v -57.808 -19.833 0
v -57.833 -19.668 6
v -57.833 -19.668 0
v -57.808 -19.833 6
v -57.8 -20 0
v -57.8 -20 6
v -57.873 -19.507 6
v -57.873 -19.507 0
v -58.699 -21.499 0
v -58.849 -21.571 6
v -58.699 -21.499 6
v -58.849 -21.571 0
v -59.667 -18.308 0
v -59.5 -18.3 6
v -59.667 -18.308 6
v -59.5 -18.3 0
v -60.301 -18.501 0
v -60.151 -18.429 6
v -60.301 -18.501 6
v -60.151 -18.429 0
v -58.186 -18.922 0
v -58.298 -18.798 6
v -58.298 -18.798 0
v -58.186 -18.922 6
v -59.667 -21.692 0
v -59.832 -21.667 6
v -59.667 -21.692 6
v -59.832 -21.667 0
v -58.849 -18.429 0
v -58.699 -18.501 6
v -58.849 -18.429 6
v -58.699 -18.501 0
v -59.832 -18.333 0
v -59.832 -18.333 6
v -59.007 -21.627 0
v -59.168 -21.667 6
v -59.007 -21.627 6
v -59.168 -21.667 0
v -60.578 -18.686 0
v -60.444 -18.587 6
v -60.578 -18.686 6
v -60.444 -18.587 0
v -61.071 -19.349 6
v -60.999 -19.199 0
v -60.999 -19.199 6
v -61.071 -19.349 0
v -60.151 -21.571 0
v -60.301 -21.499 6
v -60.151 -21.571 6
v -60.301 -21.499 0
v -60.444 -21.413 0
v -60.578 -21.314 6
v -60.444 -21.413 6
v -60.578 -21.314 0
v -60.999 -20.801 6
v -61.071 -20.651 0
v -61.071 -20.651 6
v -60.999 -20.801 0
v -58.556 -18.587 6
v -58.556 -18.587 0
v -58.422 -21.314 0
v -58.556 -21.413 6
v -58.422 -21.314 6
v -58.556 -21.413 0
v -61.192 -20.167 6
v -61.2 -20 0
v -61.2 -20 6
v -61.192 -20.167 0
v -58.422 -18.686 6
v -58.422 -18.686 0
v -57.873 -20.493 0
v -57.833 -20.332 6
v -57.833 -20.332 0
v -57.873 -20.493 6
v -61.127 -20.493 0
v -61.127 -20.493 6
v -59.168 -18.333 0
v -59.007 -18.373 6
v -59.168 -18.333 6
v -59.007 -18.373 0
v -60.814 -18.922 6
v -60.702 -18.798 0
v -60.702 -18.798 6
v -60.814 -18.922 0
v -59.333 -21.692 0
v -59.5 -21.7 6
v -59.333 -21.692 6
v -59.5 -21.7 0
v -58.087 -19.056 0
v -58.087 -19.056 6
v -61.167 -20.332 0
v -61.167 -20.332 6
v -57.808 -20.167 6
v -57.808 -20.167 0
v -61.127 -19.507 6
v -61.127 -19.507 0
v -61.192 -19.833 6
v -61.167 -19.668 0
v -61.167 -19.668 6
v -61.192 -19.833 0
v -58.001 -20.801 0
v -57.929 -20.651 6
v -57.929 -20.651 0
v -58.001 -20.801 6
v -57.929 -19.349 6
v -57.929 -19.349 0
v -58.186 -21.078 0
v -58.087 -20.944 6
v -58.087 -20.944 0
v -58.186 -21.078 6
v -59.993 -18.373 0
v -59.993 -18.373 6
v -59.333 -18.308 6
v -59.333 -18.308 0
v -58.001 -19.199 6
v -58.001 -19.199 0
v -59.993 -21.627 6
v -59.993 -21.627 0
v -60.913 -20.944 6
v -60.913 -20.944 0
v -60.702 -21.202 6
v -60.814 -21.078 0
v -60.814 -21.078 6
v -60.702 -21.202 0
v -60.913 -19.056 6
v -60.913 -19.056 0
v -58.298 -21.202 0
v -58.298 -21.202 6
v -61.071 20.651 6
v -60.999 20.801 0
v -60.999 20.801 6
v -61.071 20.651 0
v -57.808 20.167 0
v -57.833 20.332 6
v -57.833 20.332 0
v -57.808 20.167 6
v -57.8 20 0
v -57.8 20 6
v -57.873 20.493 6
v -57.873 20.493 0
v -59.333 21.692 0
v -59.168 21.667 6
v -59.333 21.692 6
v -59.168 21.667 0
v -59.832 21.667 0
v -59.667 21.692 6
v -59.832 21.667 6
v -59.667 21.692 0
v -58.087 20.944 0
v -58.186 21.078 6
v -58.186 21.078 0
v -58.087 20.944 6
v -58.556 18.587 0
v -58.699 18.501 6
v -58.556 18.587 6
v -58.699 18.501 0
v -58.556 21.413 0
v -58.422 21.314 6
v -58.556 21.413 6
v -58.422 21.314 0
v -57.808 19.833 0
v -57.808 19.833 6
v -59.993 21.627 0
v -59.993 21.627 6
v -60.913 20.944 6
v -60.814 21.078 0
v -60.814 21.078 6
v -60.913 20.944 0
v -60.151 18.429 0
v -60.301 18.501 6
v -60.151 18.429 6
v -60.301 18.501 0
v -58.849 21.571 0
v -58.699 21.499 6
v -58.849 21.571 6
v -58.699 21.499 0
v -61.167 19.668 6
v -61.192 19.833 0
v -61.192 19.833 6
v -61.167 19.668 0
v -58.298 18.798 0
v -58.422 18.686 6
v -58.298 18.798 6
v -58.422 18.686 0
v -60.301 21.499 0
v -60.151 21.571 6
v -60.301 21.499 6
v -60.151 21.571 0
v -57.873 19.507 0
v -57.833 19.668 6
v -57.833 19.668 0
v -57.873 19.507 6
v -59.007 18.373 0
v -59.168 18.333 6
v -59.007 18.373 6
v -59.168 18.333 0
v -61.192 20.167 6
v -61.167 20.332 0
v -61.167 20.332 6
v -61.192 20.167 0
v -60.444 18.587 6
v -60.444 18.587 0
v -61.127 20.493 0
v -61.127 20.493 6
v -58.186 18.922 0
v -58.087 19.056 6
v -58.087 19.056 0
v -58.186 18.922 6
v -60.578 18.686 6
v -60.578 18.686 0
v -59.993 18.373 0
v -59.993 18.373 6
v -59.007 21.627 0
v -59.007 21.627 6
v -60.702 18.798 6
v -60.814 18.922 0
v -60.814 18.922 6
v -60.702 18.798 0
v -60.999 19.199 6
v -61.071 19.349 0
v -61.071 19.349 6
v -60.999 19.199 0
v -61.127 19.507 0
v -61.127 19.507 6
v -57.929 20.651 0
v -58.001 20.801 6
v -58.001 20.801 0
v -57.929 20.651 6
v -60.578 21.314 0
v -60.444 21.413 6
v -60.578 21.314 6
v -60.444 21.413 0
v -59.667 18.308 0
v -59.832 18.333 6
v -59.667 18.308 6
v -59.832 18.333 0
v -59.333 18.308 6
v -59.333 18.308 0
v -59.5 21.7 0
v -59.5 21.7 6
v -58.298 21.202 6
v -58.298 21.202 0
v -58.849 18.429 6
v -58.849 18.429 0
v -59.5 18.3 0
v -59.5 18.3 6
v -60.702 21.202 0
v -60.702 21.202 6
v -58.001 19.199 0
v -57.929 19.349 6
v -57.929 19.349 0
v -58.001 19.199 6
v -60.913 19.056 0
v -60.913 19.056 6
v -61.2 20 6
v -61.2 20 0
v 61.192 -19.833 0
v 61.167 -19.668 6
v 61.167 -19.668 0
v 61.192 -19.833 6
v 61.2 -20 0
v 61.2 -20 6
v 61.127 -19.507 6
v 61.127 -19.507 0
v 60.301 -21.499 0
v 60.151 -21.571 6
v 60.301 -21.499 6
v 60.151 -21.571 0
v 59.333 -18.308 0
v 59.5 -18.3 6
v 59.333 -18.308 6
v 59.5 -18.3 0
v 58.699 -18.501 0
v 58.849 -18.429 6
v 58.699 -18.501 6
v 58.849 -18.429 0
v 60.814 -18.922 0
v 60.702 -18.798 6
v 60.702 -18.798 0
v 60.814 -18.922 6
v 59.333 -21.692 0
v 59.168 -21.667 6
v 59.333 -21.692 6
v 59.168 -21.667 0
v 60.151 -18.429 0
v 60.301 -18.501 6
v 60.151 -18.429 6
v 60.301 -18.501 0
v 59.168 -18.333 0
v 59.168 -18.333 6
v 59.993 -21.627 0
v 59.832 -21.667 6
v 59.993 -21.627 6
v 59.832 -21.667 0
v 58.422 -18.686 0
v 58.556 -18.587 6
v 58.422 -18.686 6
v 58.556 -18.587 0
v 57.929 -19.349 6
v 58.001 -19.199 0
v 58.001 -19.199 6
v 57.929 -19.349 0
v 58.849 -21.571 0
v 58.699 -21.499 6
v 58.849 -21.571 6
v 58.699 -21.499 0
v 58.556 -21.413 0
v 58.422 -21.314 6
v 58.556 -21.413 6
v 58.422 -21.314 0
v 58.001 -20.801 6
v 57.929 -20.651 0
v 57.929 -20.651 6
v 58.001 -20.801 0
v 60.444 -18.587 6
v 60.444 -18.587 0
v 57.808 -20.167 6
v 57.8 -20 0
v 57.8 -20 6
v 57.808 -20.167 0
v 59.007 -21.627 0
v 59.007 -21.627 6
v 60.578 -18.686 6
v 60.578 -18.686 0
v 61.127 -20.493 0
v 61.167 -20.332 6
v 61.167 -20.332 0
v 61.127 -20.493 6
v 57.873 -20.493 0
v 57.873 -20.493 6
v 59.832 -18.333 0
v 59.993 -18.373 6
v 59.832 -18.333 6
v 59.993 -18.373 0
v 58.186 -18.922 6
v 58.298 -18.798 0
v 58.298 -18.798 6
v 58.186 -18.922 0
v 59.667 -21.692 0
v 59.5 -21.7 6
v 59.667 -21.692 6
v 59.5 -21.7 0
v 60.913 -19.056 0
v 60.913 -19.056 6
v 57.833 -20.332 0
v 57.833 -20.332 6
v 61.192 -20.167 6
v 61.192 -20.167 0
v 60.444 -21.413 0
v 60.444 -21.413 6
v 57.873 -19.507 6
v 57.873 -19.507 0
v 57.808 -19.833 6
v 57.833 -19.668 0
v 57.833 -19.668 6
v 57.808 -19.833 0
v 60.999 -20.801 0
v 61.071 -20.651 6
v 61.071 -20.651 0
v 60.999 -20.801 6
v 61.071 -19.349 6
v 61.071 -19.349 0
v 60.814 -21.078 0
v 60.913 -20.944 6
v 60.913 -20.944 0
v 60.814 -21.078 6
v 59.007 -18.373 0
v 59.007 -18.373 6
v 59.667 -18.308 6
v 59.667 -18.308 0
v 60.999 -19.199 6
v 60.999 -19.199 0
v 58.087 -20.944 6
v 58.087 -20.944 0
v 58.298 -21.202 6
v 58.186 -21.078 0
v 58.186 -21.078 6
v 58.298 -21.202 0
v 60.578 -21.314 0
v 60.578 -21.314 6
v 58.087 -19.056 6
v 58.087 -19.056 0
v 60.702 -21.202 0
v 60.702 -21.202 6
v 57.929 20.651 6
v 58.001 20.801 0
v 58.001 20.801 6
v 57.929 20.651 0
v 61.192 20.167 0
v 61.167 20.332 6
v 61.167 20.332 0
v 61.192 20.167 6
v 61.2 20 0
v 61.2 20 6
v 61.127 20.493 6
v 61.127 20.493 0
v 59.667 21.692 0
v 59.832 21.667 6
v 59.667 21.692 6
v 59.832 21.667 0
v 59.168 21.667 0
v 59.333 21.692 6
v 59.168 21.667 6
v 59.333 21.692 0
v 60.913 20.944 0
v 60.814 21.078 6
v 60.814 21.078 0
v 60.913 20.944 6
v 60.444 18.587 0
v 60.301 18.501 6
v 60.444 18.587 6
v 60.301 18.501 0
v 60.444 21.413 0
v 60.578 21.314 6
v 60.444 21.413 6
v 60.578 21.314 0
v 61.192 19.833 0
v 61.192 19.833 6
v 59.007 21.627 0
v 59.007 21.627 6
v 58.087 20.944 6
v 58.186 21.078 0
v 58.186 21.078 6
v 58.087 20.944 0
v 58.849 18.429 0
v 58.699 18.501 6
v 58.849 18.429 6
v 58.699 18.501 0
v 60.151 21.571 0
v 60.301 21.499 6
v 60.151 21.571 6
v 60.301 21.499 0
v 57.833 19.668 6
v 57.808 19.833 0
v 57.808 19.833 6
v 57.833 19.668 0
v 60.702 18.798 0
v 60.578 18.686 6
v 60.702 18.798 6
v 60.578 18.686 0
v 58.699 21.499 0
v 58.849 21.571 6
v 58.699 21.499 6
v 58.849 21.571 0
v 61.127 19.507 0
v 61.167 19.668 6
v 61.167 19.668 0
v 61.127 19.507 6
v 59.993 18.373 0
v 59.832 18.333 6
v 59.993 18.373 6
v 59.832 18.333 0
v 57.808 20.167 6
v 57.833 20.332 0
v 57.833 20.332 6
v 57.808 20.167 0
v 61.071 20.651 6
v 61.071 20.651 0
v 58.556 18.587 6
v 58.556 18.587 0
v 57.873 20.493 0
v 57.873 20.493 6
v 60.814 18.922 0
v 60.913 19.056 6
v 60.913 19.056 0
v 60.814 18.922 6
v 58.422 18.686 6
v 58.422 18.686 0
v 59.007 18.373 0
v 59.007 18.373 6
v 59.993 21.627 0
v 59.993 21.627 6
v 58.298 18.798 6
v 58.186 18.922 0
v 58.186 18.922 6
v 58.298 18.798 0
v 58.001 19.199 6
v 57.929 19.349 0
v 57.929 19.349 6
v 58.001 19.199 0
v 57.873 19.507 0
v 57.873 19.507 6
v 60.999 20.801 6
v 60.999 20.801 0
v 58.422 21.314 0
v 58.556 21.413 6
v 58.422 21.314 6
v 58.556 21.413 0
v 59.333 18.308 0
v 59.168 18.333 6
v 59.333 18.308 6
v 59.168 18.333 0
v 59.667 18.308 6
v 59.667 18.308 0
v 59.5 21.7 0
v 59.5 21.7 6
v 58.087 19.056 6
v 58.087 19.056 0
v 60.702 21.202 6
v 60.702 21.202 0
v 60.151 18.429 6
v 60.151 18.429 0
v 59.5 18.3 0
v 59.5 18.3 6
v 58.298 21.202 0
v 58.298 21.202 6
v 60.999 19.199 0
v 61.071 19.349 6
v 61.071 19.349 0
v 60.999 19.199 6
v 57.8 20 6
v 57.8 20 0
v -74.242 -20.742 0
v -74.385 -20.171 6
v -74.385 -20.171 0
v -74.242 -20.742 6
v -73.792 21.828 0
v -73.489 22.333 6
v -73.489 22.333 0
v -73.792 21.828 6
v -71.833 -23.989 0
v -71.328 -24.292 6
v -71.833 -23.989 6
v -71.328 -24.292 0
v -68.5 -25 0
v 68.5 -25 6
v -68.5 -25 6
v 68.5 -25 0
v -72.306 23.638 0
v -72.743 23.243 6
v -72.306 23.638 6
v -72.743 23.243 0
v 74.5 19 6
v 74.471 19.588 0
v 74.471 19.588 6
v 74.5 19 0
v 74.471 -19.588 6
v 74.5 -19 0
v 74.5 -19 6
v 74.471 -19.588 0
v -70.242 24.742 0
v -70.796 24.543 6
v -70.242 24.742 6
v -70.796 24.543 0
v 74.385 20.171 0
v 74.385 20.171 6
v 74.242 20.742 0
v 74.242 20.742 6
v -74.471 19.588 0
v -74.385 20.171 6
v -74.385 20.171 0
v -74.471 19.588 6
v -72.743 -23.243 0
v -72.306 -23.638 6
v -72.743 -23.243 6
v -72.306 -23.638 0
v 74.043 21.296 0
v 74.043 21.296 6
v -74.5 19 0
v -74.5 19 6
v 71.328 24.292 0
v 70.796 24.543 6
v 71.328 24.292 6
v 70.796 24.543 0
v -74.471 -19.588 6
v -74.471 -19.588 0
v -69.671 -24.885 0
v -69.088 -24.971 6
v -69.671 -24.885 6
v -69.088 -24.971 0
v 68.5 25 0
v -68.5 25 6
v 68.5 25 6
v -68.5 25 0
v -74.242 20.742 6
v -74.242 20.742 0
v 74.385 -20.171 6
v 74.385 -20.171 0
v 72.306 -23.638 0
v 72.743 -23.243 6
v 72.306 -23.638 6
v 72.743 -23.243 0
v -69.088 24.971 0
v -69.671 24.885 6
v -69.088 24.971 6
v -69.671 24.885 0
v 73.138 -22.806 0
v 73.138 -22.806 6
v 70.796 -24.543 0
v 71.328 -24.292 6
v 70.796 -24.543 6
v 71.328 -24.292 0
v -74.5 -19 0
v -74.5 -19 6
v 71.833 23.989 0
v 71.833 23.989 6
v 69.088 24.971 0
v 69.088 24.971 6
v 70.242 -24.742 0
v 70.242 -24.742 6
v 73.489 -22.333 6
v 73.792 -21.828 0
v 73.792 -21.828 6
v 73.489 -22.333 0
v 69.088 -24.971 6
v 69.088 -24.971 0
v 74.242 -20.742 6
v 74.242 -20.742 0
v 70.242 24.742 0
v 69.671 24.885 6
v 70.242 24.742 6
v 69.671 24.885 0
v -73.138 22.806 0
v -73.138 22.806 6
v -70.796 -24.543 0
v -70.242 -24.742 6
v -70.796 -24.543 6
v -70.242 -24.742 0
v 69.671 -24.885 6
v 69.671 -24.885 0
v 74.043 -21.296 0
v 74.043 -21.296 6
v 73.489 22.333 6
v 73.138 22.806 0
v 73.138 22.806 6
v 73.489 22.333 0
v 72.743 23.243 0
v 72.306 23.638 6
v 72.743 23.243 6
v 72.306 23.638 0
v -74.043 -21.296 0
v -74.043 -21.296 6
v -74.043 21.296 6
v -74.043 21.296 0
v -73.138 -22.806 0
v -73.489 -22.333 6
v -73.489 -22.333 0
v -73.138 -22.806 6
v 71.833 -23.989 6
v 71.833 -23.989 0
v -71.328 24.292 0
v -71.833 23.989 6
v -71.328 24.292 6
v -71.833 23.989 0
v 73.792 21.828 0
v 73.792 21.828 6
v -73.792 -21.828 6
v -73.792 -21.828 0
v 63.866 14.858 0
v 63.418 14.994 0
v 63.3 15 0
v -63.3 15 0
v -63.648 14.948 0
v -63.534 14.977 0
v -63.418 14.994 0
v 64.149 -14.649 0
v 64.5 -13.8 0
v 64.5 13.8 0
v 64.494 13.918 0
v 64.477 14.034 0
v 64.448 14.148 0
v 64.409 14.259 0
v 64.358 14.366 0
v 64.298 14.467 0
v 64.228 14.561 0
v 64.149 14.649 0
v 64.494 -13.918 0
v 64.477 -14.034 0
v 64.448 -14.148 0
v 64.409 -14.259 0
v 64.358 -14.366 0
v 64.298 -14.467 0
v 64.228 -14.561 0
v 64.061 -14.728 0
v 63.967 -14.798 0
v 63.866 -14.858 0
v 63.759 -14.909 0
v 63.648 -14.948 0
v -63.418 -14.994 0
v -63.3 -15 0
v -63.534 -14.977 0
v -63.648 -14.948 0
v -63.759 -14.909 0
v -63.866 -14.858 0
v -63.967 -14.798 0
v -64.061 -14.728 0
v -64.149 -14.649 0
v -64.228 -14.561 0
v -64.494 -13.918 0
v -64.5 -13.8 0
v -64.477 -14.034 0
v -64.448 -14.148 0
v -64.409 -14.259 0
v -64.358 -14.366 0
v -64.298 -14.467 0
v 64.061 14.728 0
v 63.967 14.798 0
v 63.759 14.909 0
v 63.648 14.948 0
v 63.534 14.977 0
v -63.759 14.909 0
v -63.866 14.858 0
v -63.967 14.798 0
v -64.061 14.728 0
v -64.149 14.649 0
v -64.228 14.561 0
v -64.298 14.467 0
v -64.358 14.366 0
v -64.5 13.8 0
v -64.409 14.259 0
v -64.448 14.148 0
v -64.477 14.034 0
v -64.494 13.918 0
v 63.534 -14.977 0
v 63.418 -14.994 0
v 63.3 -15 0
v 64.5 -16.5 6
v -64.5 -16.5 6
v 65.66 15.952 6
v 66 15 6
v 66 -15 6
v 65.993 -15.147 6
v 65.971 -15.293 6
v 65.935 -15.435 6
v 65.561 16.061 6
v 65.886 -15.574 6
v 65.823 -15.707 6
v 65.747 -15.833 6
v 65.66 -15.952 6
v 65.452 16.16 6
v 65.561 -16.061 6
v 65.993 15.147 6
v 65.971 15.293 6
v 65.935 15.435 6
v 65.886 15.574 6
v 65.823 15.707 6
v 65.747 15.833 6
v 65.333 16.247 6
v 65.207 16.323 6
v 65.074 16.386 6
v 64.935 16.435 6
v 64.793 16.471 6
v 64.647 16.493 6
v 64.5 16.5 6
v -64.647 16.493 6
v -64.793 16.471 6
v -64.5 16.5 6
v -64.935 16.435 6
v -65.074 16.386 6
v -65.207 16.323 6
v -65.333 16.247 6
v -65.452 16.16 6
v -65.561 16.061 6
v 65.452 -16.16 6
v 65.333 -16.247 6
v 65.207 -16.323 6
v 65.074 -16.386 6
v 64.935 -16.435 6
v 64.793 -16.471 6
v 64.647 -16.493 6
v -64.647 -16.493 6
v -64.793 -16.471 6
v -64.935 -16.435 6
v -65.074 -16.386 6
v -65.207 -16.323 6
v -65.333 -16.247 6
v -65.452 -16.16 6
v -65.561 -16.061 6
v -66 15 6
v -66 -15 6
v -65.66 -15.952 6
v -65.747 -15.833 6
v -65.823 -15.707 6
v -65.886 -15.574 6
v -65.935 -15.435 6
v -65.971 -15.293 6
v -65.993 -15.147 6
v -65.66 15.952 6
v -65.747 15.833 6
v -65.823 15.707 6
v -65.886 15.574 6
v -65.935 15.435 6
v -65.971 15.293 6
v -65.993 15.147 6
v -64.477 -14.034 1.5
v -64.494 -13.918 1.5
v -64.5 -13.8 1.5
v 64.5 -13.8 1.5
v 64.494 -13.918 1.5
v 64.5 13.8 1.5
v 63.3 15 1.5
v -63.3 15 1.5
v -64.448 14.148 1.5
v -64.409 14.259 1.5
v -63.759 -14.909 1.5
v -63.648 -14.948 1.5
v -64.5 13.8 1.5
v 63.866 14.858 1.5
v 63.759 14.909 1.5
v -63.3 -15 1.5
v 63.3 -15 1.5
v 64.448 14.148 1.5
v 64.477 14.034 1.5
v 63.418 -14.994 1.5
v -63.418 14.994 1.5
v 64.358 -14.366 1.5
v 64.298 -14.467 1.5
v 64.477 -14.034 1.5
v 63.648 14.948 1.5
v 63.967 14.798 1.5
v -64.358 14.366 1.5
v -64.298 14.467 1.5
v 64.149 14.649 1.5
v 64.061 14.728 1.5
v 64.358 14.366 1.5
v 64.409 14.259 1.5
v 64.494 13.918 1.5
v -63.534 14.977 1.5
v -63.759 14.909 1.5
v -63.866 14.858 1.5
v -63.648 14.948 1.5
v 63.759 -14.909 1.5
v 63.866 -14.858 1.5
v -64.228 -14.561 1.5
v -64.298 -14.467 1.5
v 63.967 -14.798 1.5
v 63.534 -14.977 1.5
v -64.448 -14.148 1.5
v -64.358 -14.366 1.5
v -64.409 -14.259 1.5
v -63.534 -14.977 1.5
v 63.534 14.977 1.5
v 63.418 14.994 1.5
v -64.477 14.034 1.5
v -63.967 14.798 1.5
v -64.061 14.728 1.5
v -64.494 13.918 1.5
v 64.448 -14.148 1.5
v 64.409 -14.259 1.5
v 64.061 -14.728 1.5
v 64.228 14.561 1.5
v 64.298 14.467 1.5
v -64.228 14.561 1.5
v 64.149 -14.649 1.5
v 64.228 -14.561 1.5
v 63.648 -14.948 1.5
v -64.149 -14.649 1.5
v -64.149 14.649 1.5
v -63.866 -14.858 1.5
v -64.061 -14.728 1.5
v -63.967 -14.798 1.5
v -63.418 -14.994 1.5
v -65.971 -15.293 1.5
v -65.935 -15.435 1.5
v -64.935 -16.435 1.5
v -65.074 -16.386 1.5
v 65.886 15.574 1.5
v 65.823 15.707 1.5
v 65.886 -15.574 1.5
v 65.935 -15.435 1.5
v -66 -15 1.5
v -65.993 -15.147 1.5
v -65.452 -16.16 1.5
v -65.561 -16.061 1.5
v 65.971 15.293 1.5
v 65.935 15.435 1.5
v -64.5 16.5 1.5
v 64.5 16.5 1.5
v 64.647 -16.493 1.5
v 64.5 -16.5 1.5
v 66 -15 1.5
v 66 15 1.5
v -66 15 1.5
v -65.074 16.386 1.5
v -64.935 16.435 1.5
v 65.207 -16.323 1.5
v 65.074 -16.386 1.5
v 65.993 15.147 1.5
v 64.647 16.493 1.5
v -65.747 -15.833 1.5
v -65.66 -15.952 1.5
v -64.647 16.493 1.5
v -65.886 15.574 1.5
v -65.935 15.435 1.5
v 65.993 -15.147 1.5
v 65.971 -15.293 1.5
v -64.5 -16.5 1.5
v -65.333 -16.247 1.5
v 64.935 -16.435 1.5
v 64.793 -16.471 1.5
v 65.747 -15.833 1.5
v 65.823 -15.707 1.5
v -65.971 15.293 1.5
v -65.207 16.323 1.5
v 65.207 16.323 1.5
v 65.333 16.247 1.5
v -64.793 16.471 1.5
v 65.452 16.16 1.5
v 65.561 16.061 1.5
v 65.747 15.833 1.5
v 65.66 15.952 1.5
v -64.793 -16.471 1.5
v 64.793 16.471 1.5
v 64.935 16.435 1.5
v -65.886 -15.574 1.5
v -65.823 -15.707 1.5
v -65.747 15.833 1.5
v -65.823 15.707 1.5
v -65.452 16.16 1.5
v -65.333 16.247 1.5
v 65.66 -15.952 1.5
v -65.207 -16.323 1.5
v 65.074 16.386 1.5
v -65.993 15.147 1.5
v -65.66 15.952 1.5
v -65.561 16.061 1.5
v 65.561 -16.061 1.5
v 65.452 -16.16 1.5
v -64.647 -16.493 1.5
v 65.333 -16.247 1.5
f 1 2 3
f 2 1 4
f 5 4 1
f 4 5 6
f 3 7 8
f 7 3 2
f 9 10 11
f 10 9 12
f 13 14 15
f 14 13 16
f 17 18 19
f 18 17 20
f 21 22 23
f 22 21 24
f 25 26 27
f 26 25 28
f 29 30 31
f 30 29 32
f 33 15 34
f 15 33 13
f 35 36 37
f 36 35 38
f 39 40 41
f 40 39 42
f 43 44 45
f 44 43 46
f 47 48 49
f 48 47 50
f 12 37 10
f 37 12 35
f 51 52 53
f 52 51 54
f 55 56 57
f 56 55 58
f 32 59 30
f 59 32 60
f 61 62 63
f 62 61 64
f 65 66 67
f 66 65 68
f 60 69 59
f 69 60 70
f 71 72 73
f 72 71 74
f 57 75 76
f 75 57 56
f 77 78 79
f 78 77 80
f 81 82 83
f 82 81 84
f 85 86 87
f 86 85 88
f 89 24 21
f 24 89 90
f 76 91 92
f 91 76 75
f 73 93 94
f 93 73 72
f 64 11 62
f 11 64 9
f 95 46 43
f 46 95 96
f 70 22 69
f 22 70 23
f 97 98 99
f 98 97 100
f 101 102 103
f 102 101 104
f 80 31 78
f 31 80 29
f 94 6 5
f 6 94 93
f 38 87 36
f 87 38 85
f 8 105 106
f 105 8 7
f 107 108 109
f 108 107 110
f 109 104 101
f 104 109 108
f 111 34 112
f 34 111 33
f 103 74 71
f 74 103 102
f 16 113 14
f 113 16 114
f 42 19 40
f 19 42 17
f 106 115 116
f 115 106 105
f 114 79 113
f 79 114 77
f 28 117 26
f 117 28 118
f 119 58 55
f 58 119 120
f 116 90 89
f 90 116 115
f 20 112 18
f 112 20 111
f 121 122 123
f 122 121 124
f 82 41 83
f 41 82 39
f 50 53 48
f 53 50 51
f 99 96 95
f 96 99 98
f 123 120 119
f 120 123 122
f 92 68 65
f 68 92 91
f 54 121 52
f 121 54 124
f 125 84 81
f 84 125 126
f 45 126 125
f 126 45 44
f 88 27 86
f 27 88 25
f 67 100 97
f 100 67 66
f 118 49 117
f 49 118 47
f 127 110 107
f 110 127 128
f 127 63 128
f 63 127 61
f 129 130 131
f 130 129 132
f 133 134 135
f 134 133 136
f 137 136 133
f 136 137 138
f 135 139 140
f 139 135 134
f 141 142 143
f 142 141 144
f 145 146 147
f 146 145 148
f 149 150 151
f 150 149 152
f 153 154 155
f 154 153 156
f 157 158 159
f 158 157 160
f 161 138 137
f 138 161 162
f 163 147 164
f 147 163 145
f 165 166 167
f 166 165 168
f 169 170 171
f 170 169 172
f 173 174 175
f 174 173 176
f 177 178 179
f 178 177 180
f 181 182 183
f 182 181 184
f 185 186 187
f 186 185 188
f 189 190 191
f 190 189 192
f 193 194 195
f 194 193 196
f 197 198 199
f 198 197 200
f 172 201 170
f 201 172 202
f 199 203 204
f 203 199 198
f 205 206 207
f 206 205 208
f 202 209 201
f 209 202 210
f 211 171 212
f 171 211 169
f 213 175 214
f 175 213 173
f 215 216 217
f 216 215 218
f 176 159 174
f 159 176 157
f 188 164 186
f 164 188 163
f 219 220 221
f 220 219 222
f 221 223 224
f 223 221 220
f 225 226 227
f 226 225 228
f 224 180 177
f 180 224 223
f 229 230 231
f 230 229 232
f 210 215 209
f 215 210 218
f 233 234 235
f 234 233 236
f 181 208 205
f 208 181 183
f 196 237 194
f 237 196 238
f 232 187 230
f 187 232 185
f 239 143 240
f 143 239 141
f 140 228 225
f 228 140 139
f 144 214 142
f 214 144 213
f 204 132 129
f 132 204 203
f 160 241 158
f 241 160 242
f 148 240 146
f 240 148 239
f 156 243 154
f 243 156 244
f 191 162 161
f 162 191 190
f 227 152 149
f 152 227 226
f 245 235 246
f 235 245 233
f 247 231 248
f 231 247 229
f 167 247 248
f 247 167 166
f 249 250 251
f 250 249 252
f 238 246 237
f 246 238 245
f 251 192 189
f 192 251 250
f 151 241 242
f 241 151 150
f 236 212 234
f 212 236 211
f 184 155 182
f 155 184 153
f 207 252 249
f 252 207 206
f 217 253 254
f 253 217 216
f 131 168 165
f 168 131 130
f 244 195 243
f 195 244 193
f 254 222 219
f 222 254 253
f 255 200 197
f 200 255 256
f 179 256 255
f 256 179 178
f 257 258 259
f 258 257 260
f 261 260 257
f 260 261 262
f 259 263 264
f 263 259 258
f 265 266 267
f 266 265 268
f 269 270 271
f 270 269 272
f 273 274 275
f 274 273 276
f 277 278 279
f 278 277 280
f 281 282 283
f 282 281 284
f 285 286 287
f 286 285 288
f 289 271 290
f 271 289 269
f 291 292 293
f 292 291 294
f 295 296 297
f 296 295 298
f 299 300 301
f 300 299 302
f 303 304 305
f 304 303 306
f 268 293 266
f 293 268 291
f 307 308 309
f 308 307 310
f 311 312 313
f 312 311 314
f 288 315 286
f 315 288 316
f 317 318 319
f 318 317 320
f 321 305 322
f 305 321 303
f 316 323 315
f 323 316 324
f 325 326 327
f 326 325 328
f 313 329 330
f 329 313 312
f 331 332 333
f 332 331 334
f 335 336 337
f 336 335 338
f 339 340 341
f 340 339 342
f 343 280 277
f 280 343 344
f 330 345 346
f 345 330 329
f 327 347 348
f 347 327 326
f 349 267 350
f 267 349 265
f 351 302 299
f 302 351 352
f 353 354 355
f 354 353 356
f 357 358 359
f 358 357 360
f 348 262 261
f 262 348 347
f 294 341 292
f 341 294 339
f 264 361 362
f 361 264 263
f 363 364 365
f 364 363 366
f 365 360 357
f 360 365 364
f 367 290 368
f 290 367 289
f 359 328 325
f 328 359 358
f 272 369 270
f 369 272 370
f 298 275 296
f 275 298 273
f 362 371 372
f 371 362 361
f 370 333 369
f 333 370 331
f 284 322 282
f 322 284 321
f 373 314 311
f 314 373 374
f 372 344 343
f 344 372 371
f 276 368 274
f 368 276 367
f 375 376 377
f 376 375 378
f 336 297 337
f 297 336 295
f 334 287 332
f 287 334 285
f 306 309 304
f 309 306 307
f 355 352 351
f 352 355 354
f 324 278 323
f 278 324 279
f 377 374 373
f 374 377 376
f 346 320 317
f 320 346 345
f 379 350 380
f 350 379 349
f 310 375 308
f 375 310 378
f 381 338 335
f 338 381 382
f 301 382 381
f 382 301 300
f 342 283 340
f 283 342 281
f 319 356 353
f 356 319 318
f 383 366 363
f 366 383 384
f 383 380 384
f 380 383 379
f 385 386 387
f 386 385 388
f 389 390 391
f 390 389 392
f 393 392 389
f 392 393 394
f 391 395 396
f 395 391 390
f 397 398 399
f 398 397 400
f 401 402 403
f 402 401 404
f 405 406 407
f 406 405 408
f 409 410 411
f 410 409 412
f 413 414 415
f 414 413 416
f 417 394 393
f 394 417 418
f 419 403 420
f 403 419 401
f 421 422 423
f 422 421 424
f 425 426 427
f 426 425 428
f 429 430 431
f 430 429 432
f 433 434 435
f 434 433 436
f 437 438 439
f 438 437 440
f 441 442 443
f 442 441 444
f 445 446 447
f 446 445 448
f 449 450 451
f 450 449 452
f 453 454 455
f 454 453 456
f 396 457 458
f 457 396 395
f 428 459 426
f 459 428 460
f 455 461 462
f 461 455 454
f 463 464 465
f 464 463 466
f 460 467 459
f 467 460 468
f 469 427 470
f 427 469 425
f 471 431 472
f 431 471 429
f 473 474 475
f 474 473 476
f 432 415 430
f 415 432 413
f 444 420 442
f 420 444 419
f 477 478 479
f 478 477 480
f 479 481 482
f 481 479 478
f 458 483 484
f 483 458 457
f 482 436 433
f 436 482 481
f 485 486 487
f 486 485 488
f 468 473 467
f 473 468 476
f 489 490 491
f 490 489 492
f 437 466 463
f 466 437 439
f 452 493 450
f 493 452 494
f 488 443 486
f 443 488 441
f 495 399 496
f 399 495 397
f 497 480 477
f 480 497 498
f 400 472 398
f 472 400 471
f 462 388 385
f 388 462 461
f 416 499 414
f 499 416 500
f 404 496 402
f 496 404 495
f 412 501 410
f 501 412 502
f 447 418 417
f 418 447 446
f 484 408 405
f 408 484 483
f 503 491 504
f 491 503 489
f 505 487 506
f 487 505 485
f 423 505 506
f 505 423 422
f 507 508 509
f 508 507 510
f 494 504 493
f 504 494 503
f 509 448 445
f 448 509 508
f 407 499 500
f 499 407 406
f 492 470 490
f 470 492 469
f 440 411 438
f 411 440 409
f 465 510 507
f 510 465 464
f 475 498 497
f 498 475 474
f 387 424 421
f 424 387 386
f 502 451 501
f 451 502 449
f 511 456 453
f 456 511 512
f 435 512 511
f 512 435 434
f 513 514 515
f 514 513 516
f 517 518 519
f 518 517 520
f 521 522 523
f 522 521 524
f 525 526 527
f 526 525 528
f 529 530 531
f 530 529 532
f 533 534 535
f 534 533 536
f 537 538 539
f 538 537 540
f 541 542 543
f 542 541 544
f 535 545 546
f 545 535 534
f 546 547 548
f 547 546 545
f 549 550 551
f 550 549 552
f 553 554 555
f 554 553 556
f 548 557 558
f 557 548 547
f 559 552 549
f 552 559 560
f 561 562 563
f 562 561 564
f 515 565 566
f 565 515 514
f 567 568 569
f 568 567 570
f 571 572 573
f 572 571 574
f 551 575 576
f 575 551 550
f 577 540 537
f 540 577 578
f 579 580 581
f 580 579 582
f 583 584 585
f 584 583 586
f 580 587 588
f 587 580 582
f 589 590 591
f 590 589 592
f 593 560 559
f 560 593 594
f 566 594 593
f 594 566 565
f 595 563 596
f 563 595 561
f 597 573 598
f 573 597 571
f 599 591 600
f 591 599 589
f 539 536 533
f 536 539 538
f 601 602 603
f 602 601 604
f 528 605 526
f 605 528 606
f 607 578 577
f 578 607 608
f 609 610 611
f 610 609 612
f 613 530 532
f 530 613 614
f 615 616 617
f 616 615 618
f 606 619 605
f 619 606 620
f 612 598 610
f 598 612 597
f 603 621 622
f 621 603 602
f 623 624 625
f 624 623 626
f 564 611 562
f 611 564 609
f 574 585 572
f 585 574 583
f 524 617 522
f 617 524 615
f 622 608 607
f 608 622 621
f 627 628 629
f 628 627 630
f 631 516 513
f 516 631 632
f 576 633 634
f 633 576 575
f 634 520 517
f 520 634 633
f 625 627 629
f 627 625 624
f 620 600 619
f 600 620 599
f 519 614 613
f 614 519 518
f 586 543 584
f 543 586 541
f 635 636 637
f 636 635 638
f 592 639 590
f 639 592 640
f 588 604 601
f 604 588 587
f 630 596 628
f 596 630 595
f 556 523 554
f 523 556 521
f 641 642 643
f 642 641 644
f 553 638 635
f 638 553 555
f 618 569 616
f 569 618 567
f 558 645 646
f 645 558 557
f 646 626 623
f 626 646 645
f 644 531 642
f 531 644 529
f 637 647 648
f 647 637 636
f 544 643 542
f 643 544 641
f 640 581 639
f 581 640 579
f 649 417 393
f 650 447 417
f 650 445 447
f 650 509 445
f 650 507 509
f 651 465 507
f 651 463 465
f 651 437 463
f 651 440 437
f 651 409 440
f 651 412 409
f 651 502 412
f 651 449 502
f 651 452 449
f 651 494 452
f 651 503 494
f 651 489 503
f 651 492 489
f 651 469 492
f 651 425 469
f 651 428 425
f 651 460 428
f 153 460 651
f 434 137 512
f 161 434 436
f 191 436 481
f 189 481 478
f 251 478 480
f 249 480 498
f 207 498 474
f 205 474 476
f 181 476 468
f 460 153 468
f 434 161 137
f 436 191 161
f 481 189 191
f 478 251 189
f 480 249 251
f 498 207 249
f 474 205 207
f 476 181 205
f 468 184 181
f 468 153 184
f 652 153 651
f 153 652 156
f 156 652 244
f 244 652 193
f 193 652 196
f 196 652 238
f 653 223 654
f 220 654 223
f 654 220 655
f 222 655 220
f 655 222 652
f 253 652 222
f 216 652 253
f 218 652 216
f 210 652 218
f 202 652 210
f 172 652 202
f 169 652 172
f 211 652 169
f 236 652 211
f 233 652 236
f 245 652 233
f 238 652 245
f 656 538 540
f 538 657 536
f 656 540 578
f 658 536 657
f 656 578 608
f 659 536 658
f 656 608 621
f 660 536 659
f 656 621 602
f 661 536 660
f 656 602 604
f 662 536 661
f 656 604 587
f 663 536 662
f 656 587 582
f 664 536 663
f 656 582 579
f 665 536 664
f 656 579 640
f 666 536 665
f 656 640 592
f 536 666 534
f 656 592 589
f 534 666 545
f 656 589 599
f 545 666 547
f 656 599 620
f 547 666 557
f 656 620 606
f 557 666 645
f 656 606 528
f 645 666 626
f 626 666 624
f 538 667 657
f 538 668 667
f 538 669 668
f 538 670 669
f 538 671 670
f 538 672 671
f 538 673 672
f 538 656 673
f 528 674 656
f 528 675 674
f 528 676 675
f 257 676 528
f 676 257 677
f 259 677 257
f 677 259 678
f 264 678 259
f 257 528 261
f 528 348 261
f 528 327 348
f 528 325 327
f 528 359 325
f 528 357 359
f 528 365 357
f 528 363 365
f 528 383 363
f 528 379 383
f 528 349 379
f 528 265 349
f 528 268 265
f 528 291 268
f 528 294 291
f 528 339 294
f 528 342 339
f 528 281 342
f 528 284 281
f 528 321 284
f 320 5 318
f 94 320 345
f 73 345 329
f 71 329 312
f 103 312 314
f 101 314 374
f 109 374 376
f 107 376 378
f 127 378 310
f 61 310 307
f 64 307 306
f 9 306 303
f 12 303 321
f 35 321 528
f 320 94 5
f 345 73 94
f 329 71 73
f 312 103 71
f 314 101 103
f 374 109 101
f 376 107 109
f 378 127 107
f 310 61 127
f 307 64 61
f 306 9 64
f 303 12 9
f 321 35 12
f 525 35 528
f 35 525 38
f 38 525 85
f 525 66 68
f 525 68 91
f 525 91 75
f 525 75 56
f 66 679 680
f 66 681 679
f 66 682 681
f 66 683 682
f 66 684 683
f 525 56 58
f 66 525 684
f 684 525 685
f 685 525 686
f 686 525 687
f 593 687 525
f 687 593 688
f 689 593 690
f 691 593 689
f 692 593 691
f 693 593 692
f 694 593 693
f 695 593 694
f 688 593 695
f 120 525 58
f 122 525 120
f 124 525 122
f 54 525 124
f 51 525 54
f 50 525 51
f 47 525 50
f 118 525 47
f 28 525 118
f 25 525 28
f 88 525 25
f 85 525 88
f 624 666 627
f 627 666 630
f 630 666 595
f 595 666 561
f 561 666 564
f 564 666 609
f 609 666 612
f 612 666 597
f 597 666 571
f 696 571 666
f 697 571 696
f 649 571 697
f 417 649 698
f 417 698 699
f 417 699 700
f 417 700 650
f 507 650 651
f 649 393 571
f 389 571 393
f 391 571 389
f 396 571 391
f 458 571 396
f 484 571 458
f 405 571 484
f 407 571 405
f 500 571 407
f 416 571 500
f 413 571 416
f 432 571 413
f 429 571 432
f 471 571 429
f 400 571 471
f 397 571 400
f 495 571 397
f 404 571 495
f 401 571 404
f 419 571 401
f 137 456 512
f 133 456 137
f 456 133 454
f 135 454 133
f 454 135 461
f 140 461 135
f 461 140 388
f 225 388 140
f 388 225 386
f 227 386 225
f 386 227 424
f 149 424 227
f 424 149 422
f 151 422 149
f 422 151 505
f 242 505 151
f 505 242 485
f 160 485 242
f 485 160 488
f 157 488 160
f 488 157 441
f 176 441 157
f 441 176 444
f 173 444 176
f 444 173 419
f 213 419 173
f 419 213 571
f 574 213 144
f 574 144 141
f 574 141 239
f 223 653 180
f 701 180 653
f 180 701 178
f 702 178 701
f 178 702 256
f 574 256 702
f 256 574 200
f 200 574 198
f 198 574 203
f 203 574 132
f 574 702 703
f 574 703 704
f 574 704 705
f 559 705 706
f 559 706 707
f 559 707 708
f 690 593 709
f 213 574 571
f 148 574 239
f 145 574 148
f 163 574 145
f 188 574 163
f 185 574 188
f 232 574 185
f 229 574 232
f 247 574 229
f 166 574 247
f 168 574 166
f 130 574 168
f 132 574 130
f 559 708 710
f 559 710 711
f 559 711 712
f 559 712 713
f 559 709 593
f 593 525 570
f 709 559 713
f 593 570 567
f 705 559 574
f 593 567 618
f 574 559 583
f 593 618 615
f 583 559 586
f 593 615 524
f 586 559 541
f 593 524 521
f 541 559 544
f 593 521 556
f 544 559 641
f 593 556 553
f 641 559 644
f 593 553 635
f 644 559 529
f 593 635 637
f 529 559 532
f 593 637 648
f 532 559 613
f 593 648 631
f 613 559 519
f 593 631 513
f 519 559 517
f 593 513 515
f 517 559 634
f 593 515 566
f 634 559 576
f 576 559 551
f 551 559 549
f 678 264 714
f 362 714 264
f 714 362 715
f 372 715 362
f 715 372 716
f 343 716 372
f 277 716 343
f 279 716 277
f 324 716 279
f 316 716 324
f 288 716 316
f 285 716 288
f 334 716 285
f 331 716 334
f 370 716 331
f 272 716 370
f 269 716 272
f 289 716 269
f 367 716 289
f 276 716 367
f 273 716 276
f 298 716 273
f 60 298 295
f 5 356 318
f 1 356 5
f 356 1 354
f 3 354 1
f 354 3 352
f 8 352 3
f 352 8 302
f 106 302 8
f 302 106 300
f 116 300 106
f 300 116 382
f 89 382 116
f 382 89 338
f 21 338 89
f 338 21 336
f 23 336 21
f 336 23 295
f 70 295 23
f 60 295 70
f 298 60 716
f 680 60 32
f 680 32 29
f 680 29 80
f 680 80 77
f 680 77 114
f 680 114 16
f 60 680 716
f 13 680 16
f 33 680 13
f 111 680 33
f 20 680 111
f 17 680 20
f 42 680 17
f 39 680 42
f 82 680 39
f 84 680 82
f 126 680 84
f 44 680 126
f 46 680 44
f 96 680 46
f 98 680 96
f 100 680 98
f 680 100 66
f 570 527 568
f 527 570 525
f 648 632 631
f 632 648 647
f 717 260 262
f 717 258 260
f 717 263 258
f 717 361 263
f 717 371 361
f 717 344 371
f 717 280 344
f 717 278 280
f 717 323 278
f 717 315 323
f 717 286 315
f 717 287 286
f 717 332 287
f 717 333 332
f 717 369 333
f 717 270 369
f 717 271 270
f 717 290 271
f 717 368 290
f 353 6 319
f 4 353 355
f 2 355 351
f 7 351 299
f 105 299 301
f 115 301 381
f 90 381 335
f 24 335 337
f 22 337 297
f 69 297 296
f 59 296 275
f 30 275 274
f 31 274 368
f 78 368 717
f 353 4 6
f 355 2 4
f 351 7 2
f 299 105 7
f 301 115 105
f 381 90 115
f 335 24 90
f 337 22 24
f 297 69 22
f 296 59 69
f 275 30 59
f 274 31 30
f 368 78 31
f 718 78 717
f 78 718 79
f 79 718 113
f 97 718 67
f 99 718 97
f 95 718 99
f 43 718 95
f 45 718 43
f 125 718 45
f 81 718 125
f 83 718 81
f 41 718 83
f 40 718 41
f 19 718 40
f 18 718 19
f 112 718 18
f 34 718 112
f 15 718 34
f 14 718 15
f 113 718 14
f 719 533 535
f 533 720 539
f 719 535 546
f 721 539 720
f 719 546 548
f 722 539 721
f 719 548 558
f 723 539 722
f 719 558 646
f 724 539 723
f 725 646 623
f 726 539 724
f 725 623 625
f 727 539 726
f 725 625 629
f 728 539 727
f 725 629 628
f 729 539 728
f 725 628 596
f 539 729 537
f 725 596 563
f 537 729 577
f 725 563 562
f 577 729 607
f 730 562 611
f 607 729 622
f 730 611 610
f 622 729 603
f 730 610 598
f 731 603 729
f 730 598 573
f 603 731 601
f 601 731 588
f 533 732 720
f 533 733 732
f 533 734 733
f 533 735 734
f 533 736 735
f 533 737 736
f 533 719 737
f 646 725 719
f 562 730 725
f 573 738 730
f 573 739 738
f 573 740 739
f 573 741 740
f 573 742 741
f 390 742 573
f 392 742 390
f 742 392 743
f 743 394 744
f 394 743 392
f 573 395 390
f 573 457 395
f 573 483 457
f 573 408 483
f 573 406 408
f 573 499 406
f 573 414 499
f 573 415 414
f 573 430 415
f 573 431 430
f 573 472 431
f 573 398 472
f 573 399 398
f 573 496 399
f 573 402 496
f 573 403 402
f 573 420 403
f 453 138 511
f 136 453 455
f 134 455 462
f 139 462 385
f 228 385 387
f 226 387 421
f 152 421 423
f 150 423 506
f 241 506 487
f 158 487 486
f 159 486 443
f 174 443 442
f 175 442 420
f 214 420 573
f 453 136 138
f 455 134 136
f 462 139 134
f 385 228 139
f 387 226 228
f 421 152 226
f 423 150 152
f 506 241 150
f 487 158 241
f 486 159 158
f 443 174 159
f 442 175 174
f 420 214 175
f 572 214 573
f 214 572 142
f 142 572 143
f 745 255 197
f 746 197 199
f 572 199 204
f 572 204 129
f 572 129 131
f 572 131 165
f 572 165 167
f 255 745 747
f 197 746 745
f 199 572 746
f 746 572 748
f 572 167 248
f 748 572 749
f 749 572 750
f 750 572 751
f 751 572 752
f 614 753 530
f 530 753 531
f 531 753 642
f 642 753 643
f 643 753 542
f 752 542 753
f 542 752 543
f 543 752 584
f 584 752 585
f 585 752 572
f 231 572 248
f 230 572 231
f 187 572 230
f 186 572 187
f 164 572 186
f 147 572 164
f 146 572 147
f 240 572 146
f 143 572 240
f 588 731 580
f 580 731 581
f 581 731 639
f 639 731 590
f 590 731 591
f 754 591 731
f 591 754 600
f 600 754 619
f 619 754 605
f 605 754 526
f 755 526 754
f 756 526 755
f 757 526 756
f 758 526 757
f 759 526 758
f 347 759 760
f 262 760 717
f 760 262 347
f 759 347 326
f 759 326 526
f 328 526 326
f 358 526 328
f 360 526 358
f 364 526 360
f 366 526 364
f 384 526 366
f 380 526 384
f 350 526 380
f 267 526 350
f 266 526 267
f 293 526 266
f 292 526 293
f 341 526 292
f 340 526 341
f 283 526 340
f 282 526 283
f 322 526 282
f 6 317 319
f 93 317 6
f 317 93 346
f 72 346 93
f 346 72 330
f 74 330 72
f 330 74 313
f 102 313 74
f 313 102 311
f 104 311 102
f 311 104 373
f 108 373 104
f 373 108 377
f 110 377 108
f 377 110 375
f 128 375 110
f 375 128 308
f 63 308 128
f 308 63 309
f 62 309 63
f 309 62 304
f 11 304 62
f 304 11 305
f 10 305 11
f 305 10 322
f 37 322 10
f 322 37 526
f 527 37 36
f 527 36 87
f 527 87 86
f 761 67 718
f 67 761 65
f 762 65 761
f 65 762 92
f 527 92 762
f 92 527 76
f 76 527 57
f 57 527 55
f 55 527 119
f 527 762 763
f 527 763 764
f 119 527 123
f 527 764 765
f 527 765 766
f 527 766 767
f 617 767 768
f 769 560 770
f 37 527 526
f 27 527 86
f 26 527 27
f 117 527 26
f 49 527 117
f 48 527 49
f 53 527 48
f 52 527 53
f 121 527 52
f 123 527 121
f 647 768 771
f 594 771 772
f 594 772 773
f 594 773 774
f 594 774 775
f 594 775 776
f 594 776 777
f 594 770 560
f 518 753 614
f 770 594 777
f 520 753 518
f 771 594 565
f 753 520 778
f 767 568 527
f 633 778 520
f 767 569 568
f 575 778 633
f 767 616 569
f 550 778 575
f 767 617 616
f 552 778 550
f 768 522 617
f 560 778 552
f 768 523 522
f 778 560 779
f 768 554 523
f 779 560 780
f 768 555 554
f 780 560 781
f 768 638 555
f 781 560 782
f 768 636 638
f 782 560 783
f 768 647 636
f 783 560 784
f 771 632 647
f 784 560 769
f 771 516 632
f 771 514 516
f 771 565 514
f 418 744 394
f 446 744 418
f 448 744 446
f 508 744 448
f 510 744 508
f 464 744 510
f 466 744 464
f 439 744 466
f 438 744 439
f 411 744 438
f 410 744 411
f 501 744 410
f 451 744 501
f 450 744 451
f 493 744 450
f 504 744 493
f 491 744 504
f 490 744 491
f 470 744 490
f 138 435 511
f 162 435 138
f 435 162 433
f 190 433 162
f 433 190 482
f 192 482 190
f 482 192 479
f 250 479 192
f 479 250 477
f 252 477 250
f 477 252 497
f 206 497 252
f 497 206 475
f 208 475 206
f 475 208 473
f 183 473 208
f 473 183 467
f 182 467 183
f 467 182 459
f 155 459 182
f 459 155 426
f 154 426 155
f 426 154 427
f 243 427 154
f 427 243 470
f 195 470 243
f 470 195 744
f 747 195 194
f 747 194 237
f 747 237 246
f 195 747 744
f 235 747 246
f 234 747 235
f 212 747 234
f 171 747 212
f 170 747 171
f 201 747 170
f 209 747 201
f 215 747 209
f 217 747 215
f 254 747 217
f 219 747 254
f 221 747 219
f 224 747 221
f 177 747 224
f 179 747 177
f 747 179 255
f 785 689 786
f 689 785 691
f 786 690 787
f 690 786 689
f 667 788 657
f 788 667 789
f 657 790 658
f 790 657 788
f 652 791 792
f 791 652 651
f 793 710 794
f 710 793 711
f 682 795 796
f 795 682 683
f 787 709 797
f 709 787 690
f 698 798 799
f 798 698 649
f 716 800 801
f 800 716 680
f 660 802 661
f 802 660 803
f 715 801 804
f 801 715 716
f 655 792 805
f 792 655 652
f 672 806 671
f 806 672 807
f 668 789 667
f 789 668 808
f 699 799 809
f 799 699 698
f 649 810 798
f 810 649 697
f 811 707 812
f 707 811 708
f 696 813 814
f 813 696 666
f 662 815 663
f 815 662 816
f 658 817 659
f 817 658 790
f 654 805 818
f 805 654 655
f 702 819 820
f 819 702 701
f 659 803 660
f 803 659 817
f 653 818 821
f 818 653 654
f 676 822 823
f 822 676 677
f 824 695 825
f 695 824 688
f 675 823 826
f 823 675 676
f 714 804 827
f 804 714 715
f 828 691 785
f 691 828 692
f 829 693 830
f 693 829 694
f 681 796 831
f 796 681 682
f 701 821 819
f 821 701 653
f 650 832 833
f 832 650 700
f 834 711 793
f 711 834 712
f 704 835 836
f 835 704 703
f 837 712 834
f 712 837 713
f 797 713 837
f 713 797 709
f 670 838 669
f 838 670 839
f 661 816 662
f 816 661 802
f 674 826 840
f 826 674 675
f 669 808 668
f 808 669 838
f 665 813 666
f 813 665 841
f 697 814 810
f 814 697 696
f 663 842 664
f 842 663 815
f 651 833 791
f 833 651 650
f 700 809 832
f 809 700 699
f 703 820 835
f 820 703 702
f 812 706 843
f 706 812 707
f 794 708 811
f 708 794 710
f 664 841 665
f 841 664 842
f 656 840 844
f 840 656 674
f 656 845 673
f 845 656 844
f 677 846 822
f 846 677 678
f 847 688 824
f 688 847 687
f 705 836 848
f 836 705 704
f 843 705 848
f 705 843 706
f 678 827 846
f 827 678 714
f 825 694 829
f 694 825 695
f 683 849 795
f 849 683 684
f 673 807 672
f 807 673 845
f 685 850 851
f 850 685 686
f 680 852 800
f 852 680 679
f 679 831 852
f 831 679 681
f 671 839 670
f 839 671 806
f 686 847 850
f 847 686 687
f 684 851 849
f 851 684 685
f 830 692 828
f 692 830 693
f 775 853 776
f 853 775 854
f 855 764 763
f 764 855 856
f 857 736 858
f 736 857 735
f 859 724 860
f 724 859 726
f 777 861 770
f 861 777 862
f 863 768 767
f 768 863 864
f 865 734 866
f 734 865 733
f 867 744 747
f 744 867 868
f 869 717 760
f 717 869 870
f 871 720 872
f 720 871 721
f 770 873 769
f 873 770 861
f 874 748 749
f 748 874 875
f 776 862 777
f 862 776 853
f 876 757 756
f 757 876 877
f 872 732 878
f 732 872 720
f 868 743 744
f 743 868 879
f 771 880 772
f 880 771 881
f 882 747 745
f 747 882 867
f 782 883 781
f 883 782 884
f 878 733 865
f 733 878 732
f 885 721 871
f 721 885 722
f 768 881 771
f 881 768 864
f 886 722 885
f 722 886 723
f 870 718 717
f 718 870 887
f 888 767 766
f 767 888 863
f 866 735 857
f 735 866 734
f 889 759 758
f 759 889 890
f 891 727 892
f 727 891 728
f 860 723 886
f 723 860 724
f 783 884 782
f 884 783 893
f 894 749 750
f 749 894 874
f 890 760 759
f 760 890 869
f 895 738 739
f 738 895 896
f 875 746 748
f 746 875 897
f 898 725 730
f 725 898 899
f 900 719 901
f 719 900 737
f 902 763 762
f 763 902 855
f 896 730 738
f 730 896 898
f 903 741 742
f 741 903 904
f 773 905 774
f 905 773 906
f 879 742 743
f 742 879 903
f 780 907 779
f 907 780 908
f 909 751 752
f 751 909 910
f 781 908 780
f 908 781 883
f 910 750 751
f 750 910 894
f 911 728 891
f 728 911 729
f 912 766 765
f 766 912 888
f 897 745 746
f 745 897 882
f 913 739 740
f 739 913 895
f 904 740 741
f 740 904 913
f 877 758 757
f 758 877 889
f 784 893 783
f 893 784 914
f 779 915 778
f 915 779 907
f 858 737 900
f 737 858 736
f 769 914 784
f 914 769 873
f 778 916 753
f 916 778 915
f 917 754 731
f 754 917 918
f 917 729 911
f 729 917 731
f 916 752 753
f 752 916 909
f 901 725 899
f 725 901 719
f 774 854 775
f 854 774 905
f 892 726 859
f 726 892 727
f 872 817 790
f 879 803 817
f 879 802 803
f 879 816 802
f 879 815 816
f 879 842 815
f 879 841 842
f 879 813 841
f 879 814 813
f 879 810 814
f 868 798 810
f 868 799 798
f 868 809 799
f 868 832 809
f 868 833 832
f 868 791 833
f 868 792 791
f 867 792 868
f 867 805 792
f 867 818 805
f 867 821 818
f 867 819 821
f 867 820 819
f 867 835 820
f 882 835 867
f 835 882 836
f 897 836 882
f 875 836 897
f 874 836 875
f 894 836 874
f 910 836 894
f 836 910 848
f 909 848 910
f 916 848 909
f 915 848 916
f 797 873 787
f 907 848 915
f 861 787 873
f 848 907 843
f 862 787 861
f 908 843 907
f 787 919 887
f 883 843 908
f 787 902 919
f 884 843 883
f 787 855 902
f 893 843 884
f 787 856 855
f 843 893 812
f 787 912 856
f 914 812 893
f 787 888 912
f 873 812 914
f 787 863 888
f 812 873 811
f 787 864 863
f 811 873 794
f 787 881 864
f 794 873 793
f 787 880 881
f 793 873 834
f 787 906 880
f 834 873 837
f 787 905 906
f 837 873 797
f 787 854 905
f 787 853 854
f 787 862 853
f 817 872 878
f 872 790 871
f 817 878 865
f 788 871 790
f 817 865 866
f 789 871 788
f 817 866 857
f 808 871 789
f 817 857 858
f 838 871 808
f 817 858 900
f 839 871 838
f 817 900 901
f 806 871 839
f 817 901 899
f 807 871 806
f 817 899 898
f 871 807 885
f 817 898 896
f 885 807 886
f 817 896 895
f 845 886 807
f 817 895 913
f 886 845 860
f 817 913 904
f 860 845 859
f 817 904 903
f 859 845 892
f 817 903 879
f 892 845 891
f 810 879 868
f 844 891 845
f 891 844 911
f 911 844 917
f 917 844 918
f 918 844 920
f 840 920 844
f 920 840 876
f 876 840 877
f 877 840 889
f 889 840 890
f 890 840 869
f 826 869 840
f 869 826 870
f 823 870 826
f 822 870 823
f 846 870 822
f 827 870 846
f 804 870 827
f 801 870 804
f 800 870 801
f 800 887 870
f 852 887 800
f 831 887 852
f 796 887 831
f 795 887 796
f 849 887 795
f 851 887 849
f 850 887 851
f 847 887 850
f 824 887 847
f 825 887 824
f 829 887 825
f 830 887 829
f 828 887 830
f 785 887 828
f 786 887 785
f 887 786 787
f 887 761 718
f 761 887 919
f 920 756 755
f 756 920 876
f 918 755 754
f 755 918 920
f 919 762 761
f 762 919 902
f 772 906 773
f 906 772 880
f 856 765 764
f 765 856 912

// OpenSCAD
/*
  Glass Memory — MAX7219 32x8 front bezel / mounting frame — v2

  Adjusted for 4-in-1 matrices with ~1 mm gap between the four 8x8 modules.
  Estimated active assembly width: 4 x 32 mm + 3 x 1 mm = 131 mm.

  Design:
  - MAX7219 enters from the rear
  - thin front retaining lip
  - rear remains open
  - rounded outer corners
  - four M3 clearance holes in the bezel
*/

$fn = 64;

// ---------- User parameters ----------
module_w = 131.0;          // 128 mm + ~3 mm total inter-module gaps
module_h = 32.0;
module_clearance = 1.0;    // total clearance: 0.5 mm per side

// 1.5 mm retaining lip around the module face
opening_w = 129.0;
opening_h = 30.0;

// Keep the same frame margins as v1, adding 3 mm to overall width
outer_w = 149.0;
outer_h = 50.0;
outer_r = 6.0;

// Depth geometry
bezel_depth = 6.0;
front_lip_thickness = 1.5;

// M3 clearance holes
screw_d = 3.4;
screw_x_inset = 15.0;
screw_y_inset = 5.0;

// ---------- Derived values ----------
pocket_w = module_w + module_clearance; // 132 mm
pocket_h = module_h + module_clearance; // 33 mm

// ---------- Helpers ----------
module rounded_rect_2d(w, h, r) {
  hull() {
    translate([ r,  r]) circle(r=r);
    translate([w-r,  r]) circle(r=r);
    translate([ r, h-r]) circle(r=r);
    translate([w-r,h-r]) circle(r=r);
  }
}

module centered_rounded_rect_prism(w, h, d, r) {
  translate([-w/2, -h/2, 0])
    linear_extrude(height=d)
      rounded_rect_2d(w, h, r);
}

module screw_hole(x, y) {
  translate([x, y, -0.5])
    cylinder(h=bezel_depth + 1.0, d=screw_d);
}

// ---------- Final model ----------
difference() {
  centered_rounded_rect_prism(outer_w, outer_h, bezel_depth, outer_r);

  // Front viewing opening
  translate([0, 0, -0.5])
    centered_rounded_rect_prism(opening_w, opening_h, bezel_depth + 1.0, 1.2);

  // Rear pocket
  translate([0, 0, front_lip_thickness])
    centered_rounded_rect_prism(
      pocket_w,
      pocket_h,
      bezel_depth - front_lip_thickness + 0.5,
      1.5
    );

  // Four M3 clearance holes
  for (sx = [-1, 1])
    for (sy = [-1, 1])
      screw_hole(
        sx * (outer_w/2 - screw_x_inset),
        sy * (outer_h/2 - screw_y_inset)
      );
}
